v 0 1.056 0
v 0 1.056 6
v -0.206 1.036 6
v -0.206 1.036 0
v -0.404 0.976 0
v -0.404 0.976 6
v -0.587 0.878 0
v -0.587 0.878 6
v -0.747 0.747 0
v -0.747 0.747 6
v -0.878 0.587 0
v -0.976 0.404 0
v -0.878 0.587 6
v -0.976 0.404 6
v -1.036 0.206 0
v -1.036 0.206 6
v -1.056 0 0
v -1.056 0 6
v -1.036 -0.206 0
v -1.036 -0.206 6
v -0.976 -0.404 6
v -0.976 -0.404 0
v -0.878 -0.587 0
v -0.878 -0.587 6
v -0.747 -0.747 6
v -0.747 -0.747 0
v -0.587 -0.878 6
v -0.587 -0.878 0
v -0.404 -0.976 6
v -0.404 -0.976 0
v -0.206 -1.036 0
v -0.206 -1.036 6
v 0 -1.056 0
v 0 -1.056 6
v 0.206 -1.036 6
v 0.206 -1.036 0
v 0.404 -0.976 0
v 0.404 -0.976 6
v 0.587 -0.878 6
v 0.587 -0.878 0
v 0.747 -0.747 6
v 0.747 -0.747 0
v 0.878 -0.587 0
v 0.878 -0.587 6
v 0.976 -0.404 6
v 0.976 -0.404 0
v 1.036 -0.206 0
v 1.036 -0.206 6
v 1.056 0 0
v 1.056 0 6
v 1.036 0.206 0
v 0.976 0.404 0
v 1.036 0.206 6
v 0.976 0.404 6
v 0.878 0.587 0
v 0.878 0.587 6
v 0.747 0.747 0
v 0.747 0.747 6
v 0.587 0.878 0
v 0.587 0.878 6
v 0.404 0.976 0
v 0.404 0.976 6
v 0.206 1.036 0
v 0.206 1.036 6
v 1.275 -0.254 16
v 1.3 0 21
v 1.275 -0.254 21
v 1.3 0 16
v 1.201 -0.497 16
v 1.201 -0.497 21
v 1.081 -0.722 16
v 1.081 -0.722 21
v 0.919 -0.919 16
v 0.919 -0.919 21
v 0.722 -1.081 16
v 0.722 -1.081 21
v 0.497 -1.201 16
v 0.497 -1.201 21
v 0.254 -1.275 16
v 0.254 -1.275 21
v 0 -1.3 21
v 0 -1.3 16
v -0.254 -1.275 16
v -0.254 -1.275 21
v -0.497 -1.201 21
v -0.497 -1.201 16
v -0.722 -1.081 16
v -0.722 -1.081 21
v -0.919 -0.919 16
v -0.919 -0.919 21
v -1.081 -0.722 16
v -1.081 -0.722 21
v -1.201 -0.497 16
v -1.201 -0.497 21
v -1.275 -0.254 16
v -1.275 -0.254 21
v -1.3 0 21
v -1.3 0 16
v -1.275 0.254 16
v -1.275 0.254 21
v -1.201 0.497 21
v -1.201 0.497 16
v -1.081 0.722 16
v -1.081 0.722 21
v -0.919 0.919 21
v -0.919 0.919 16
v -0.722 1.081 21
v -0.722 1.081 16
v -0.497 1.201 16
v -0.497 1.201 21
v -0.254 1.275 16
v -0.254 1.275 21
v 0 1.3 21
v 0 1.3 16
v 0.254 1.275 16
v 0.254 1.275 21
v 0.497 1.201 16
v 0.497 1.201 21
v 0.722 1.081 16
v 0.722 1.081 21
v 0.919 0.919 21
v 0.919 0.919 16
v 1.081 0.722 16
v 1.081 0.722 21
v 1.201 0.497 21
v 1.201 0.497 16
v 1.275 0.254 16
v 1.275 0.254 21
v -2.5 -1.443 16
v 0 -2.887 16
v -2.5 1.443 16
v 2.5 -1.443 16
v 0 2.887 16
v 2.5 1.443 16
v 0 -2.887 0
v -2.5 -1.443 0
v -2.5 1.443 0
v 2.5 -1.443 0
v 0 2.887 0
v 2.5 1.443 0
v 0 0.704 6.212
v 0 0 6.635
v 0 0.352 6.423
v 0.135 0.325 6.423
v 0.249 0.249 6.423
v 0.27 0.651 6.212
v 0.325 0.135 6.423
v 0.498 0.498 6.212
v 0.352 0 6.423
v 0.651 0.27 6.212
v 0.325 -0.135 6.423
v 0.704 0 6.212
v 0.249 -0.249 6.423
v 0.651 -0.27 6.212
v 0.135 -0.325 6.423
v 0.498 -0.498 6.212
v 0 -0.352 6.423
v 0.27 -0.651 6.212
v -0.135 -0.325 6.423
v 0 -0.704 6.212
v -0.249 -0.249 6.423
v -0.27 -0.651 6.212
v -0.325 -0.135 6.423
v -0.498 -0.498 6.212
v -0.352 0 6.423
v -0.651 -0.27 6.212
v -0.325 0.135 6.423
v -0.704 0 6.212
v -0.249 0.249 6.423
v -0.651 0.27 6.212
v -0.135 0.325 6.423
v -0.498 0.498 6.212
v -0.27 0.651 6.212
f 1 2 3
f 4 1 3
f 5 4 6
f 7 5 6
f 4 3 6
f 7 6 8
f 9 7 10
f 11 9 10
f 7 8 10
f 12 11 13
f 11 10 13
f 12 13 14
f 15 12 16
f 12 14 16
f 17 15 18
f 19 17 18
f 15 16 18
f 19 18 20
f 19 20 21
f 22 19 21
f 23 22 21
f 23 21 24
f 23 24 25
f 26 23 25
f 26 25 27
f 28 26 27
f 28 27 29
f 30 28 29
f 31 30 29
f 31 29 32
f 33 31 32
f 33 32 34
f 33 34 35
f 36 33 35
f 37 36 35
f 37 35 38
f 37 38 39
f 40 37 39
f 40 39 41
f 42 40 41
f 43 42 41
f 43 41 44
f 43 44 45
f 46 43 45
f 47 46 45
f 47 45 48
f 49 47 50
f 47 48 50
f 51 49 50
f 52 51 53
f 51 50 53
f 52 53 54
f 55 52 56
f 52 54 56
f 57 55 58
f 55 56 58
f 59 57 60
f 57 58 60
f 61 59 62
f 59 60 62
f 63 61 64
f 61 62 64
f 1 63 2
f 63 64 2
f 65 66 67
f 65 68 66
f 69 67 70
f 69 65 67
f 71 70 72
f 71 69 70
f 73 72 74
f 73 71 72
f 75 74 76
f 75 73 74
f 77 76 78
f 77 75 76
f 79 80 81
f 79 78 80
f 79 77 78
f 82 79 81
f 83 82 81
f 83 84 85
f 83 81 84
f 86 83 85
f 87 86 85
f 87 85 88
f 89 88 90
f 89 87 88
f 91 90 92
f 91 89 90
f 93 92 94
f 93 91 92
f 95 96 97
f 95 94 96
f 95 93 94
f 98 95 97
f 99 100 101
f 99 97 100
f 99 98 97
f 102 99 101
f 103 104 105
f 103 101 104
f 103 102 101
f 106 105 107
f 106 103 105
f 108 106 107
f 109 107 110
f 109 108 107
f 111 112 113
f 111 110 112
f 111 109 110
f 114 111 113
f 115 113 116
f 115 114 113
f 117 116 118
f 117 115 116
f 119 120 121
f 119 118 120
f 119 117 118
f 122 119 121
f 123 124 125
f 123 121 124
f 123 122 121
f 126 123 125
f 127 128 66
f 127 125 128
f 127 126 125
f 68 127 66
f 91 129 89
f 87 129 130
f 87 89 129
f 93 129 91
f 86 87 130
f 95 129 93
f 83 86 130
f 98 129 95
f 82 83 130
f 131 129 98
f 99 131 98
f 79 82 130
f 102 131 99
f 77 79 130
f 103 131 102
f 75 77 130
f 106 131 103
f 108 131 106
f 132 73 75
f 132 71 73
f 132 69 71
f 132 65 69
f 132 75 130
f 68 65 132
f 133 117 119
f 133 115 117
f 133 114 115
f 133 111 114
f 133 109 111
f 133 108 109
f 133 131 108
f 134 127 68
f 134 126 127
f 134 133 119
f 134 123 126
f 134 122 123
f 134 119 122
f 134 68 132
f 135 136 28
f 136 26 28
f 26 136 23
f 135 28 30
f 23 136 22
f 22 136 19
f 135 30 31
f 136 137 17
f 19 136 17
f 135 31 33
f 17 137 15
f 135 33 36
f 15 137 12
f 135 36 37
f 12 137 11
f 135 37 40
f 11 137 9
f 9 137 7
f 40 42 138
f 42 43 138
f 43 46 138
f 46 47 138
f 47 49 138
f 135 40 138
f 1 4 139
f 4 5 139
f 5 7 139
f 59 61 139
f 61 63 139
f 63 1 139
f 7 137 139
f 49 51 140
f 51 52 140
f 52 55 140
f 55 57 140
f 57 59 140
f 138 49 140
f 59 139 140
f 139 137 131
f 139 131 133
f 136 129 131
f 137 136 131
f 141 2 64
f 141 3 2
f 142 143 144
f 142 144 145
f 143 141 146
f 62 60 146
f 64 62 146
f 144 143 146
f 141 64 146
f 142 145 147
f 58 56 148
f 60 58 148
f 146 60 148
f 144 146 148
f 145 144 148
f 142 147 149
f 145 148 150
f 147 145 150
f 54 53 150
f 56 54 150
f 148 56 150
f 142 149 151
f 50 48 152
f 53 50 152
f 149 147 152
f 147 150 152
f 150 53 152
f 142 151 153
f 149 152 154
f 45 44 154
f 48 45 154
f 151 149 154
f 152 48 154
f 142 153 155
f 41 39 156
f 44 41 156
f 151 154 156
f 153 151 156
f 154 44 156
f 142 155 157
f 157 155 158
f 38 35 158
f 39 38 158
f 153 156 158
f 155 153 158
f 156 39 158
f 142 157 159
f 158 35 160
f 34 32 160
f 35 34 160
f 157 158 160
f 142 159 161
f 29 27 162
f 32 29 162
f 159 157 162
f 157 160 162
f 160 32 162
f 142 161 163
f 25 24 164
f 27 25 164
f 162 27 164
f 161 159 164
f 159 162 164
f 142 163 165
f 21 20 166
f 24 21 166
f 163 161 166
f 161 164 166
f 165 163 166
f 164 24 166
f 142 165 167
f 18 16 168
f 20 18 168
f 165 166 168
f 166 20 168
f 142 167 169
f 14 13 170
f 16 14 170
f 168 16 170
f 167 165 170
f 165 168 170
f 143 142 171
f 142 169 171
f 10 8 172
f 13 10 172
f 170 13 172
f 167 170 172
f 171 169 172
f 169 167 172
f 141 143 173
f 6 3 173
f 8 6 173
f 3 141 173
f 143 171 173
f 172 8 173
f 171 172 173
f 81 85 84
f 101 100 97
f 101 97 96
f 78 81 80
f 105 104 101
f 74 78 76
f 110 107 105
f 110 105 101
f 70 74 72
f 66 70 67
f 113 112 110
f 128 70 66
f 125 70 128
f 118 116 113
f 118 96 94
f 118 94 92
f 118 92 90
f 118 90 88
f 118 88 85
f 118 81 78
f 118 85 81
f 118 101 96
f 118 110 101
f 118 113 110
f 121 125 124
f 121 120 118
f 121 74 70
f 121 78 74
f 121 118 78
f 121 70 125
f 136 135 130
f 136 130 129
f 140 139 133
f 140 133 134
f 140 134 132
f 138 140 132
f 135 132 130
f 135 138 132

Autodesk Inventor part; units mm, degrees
ref_plane "YZ Plane" through (0, 0, 0) normal (1, 0, 0) x (0, 1, 0)
ref_plane "XZ Plane" through (0, 0, 0) normal (0, 1, 0) x (-1, 0, 0)
ref_plane "XY Plane" through (0, 0, 0) normal (0, 0, 1) x (1, 0, 0)
sketch "スケッチ1" plane through (0, 0, 0) normal (0, 0, 1) x (1, 0, 0)
  line L0 (0, 2.8868) -> (2.5, 1.4434)
  line L1 (2.5, 1.4434) -> (2.5, -1.4434)
  line L2 (2.5, -1.4434) -> (0, -2.8868)
  line L3 (0, -2.8868) -> (-2.5, -1.4434)
  line L4 (-2.5, -1.4434) -> (-2.5, 1.4434)
  line L5 (-2.5, 1.4434) -> (0, 2.8868)
  point P0 (0, 0)
  point P1 (0, 0)
  dimension "d0" = 5
extrude "押し出し1" add sketch "スケッチ1" along normal blind 16
sketch "スケッチ2" plane through (0, 0, 16) normal (0, 0, 1) x (1, 0, 0)
  circle A0 centre (0, 0) radius 1.3
  dimension "d3" = 2.6
extrude "押し出し2" add sketch "スケッチ2" along normal blind 5
thread "ねじ1" size "M2.6x0.45" class "6g" standard "ANSI Metric M Profile" full length
sketch "スケッチ3" plane through (0, 0, 0) normal (0, 0, -1) x (-1, 0, 0)
  point P0 (0, 0)
hole "穴1" at (0, 0, 0) direction (0, 0, 1) diameter 2.113 depth 6 tip angle 118 thread size "M2.6x0.45" class "6H" standard "ISO Metric profile"
properties part number "ジュラコンスペーサー（六角）_BS-2616E" material "アセタール樹脂、白"
